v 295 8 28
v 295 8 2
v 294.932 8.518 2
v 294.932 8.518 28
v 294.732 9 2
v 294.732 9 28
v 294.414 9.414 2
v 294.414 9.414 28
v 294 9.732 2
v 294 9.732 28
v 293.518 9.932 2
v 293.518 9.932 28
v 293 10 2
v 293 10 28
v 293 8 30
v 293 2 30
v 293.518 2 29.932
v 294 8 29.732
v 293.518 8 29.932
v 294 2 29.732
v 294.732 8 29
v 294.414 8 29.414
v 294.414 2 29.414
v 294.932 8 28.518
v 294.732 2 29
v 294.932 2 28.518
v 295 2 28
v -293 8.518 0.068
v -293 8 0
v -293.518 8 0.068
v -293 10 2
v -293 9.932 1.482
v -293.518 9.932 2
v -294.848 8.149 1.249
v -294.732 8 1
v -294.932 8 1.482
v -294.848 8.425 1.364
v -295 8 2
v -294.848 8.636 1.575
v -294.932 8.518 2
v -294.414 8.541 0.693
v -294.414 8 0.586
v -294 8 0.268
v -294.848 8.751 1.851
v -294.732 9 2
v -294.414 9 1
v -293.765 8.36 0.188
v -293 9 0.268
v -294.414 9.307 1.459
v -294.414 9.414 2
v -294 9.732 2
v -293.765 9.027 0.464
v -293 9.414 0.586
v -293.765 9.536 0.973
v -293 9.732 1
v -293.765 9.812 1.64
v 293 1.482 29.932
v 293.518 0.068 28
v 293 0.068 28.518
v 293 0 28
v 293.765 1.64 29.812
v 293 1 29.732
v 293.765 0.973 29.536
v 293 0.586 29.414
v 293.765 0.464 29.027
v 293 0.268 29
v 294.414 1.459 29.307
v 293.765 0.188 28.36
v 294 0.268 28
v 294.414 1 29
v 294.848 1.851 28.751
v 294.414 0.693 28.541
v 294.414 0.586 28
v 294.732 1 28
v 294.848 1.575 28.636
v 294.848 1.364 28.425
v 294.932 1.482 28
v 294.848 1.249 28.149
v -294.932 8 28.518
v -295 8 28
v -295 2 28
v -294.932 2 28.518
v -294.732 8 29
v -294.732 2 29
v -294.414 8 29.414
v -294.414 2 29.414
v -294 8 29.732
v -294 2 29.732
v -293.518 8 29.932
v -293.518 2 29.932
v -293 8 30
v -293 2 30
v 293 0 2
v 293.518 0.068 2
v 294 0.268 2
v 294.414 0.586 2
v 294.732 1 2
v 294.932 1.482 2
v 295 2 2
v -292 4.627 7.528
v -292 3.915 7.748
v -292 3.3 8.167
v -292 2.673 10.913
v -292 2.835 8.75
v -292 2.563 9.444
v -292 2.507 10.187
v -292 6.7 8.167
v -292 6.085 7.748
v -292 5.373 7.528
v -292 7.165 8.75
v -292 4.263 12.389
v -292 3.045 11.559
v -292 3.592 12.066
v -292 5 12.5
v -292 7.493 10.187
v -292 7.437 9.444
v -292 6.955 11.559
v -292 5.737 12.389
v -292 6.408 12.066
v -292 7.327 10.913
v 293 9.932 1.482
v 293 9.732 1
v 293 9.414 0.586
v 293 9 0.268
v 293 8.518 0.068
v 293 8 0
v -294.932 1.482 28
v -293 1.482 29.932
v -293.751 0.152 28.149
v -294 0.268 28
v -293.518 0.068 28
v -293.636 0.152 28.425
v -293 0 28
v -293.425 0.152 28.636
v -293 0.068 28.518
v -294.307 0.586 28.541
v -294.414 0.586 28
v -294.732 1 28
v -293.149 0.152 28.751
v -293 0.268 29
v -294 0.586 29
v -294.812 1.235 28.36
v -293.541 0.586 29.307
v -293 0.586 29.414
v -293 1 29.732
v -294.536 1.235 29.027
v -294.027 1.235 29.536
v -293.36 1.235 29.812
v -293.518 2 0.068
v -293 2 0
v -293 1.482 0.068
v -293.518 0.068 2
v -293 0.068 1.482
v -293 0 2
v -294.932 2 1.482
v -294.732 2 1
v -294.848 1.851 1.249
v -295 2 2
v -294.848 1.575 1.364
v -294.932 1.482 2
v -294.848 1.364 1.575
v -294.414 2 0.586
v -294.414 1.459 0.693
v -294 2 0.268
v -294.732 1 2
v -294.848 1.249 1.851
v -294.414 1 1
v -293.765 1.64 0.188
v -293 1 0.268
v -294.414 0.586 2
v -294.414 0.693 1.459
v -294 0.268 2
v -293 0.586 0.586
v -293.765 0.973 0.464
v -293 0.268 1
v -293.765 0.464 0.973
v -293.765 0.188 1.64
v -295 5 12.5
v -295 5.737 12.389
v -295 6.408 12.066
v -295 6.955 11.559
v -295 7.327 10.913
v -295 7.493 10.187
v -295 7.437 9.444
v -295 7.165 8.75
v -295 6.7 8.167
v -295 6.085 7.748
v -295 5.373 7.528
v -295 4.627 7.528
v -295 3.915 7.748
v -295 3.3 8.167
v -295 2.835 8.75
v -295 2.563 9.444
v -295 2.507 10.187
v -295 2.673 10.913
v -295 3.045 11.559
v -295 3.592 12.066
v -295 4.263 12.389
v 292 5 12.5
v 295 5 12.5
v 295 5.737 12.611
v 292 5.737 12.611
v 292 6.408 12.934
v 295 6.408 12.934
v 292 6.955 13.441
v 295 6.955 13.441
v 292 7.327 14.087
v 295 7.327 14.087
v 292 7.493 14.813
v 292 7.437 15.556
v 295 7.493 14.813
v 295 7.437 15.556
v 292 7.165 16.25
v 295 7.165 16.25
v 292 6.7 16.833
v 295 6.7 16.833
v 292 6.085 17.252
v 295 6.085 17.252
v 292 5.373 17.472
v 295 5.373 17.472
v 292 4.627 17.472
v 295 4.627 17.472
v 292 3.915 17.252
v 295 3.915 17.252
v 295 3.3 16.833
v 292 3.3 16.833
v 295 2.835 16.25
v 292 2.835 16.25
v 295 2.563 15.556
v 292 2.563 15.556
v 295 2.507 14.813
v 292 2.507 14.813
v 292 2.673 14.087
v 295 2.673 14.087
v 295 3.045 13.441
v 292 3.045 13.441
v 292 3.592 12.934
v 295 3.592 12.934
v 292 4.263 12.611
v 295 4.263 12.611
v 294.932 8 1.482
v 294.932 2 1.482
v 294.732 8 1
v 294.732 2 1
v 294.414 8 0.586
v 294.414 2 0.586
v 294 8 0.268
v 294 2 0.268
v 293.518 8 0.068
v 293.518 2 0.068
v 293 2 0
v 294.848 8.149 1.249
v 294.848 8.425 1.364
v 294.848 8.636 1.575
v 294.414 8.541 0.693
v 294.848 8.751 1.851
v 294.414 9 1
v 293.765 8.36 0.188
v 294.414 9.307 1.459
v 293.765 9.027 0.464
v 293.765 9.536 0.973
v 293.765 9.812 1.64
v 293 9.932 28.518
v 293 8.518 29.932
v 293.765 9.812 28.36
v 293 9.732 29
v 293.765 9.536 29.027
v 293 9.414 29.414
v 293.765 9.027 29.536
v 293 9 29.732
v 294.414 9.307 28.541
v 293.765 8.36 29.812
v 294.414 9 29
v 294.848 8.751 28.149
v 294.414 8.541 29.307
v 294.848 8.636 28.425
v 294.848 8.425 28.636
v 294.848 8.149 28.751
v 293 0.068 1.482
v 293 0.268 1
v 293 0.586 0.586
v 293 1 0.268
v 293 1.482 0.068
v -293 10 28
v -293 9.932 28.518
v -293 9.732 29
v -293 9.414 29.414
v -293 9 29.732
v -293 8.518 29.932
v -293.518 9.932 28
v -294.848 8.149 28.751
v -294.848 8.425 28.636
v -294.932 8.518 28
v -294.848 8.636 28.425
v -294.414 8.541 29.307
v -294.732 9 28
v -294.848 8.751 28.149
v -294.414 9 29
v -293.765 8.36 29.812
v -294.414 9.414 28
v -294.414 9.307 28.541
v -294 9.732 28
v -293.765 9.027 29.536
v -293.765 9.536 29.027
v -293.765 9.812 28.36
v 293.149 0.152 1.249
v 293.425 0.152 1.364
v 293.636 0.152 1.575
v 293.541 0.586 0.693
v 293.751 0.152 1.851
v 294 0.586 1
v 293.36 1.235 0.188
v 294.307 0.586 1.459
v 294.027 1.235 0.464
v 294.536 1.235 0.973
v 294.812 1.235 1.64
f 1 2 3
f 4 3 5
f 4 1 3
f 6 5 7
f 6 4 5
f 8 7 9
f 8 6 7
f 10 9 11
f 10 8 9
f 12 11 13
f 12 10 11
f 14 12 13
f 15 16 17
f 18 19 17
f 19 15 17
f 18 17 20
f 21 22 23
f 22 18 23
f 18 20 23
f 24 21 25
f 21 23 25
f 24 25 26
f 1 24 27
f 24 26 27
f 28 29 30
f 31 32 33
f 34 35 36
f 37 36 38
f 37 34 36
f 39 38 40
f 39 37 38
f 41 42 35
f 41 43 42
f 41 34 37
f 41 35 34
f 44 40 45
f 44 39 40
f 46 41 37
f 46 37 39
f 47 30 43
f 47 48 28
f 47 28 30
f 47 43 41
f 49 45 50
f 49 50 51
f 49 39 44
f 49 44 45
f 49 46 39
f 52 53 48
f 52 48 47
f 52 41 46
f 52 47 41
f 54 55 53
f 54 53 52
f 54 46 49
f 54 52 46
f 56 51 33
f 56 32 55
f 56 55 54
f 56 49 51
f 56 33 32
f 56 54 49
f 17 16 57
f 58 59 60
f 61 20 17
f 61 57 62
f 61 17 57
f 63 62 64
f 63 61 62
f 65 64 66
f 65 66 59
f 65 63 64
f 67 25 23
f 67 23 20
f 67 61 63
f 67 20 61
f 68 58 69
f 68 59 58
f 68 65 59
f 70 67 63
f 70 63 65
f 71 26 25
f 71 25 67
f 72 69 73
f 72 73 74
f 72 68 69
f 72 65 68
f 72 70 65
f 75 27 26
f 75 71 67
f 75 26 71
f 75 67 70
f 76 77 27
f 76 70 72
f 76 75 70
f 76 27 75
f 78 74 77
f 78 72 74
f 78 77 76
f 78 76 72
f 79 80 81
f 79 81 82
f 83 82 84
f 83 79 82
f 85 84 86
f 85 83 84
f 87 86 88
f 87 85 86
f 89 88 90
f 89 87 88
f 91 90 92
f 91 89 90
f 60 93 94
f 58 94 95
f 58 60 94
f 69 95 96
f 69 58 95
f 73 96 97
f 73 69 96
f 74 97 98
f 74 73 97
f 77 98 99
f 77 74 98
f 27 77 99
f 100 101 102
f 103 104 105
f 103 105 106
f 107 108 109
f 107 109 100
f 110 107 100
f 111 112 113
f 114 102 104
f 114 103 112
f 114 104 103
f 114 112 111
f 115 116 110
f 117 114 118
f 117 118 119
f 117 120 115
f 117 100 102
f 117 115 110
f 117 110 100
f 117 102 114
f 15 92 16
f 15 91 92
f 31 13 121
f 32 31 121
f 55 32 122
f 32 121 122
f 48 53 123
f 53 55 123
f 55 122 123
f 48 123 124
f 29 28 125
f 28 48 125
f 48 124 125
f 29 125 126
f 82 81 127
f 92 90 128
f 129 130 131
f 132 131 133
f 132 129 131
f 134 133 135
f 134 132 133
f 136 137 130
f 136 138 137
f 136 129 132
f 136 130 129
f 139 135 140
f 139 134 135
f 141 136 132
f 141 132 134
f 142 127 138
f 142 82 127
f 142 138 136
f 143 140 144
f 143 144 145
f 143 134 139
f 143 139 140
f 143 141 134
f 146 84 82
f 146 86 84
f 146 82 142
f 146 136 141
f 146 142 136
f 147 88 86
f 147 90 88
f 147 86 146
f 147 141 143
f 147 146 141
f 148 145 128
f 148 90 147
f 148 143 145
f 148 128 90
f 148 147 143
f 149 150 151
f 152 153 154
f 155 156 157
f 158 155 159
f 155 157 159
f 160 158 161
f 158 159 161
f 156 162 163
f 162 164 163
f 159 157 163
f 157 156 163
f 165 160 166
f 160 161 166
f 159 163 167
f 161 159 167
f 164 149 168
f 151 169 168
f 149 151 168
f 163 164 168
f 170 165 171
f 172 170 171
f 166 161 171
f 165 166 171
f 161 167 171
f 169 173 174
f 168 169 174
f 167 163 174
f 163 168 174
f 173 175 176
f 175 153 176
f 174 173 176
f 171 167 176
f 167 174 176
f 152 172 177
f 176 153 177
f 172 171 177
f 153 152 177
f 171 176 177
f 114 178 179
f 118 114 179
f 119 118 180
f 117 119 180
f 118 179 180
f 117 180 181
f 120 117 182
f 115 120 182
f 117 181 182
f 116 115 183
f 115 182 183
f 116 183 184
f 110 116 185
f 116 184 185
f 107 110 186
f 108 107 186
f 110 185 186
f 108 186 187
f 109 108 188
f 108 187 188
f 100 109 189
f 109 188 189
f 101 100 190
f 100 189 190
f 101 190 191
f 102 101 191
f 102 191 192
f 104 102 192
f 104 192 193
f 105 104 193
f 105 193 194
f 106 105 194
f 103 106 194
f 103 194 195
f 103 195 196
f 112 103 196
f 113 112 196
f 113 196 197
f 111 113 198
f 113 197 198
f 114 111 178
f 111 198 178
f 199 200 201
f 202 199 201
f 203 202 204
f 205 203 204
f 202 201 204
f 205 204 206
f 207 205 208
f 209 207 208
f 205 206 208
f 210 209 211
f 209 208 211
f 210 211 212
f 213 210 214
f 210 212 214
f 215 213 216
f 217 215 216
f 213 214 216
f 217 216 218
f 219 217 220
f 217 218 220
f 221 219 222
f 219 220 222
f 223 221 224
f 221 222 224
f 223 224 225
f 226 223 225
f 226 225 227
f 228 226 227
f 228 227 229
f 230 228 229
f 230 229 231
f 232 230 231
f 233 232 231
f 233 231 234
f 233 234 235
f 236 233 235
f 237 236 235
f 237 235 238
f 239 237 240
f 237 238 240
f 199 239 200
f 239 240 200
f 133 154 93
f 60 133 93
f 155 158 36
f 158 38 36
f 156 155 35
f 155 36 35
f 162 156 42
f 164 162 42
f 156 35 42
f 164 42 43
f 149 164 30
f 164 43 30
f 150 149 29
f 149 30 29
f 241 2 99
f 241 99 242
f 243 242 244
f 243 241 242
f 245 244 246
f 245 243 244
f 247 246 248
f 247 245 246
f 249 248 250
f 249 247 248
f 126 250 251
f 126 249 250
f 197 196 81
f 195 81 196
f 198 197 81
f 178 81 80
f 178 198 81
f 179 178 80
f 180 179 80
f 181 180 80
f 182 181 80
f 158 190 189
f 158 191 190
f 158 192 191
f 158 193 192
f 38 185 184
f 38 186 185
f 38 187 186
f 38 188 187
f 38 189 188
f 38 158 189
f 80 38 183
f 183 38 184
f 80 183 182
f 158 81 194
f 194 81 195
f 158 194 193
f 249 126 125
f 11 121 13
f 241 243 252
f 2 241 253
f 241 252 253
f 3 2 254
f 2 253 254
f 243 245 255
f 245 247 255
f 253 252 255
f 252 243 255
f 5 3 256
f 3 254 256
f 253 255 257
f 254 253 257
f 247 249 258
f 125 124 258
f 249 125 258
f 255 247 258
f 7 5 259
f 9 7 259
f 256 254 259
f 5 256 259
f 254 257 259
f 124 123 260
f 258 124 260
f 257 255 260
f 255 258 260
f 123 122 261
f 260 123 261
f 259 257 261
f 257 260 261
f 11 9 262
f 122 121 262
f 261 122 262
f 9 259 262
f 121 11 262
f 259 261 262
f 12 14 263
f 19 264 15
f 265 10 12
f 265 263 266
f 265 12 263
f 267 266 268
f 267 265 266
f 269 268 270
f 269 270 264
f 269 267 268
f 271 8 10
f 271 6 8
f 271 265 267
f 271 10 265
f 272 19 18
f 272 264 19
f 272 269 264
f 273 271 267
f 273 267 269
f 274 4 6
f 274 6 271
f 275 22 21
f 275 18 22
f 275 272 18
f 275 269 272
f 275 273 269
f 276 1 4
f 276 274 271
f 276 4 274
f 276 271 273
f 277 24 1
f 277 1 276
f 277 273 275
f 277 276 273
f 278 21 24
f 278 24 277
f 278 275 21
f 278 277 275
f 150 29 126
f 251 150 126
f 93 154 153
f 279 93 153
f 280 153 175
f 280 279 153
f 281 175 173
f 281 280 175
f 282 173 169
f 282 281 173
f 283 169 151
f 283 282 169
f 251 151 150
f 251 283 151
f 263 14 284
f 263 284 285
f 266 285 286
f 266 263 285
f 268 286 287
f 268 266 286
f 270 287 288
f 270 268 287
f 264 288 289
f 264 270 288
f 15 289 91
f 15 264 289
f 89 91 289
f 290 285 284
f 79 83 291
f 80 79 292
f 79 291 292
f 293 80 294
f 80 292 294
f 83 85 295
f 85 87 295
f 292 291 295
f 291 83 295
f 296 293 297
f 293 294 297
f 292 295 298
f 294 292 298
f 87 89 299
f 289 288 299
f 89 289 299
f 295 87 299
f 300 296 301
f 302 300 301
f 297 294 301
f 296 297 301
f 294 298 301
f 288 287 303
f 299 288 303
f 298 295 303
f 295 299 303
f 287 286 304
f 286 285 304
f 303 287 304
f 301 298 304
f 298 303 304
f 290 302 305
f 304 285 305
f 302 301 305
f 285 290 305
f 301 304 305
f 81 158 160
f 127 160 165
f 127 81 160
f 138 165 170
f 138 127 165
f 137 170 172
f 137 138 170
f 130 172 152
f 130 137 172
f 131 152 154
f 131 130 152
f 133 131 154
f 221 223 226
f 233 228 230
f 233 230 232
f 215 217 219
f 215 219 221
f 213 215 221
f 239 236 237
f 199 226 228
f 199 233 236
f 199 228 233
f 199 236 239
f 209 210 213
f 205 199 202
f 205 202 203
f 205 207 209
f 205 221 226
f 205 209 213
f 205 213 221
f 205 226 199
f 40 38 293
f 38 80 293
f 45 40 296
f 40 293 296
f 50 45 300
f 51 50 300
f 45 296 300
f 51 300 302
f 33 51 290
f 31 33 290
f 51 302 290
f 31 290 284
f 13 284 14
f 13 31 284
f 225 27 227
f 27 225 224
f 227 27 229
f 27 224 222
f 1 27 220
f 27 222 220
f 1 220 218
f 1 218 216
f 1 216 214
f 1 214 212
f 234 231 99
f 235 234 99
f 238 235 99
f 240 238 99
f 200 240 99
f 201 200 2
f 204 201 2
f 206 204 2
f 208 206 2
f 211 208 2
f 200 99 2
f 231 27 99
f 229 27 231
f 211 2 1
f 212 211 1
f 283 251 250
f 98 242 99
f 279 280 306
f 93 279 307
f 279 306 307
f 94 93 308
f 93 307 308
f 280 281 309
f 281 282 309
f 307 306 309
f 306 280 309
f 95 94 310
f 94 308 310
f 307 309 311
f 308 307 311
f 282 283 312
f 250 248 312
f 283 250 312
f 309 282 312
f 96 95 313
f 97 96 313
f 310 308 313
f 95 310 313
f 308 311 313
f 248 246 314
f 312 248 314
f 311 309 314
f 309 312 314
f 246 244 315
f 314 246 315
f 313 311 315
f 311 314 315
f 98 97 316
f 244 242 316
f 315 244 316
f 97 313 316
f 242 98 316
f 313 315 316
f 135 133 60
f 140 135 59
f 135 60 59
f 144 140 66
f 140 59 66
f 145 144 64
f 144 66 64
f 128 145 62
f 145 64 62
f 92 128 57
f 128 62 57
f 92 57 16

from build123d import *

# Parameters (mm, degrees)
SKETCH1_W           = 590
SKETCH1_H           = 10
BOSS_EXTRUDE1_DEPTH = 30
FILLET1_R           = 2
FILLET2_R           = 2
SKETCH5_R           = 2.5
CUT_EXTRUDE7_DEPTH  = 3
SKETCH6_R           = 2.5
CUT_EXTRUDE8_DEPTH  = 3


with BuildPart() as part:
    # Sketch1 → Boss-Extrude1 (new body)
    with BuildSketch(Plane.XY):
        with Locations((0, 5)):
            Rectangle(SKETCH1_W, SKETCH1_H)
    extrude(amount=BOSS_EXTRUDE1_DEPTH)

    # Fillet1
    fillet1_edges = [part.edges().sort_by_distance(p)[0] for p in [
        (0, 10, 30),
        (-295, 5, 30),
        (0, 10, 0),
        (295, 5, 0),
        (0, 0, 0),
        (-295, 5, 0),
        (-295, 10, 15),
        (295, 10, 15),
        (295, 0, 15),
        (-295, 0, 15),
        (0, 0, 30),
    ]]
    fillet(fillet1_edges, radius=FILLET1_R)

    # Fillet2
    # the kernel refuses this fillet: 2 mm, written as the material it takes off along each edge
    with BuildSketch(Plane(origin=(293, 8, 28), x_dir=(0, 0, 1), z_dir=(1, 0, 0))) as fillet2_piece_1_section:
        Polygon((0, 0), (FILLET2_R, 0), (FILLET2_R, -FILLET2_R), (0, -FILLET2_R), align=None)
    fillet2_piece_1 = extrude(amount=FILLET2_R, mode=Mode.PRIVATE)
    fillet2_piece_1 = fillet2_piece_1 - Plane(origin=(293, 8, 28), x_dir=(0, -0.7071067811865475, -0.7071067811865475), z_dir=(1, 0, 0)) * Sphere(FILLET2_R, mode=Mode.PRIVATE)
    add(fillet2_piece_1, mode=Mode.SUBTRACT)
    with BuildSketch(Plane(origin=(293, 2, 28), x_dir=(0, 0, 1), z_dir=(1, 0, 0))) as fillet2_piece_2_section:
        Polygon((0, 0), (FILLET2_R, 0), (FILLET2_R, FILLET2_R), (0, FILLET2_R), align=None)
    fillet2_piece_2 = extrude(amount=FILLET2_R, mode=Mode.PRIVATE)
    fillet2_piece_2 = fillet2_piece_2 - Plane(origin=(293, 2, 28), x_dir=(0, 0.7071067811865475, -0.7071067811865475), z_dir=(1, 0, 0)) * Sphere(FILLET2_R, mode=Mode.PRIVATE)
    add(fillet2_piece_2, mode=Mode.SUBTRACT)
    with BuildSketch(Plane(origin=(295, 2, 30), x_dir=(0, 0, -1), z_dir=(0, 1, 0))) as fillet2_piece_3:
        with BuildLine():
            CenterArc((FILLET2_R, FILLET2_R), FILLET2_R, 180, 90)
            Line((0, FILLET2_R), (0, 0))
            Line((0, 0), (FILLET2_R, 0))
        make_face()
    extrude(amount=6, mode=Mode.SUBTRACT)

    # Sketch5 → Cut-Extrude7 (cut)
    with BuildSketch(Plane.ZY.offset(295)):
        with Locations((10, 5)):
            Circle(SKETCH5_R)
    extrude(amount=-CUT_EXTRUDE7_DEPTH, mode=Mode.SUBTRACT)

    # Sketch6 → Cut-Extrude8 (cut)
    with BuildSketch(Plane(origin=(295, 0, 0), x_dir=(0, 0, -1), z_dir=(1, 0, 0))):
        with Locations((-15, 5)):
            Circle(SKETCH6_R)
    extrude(amount=-CUT_EXTRUDE8_DEPTH, mode=Mode.SUBTRACT)


solid = part.part
